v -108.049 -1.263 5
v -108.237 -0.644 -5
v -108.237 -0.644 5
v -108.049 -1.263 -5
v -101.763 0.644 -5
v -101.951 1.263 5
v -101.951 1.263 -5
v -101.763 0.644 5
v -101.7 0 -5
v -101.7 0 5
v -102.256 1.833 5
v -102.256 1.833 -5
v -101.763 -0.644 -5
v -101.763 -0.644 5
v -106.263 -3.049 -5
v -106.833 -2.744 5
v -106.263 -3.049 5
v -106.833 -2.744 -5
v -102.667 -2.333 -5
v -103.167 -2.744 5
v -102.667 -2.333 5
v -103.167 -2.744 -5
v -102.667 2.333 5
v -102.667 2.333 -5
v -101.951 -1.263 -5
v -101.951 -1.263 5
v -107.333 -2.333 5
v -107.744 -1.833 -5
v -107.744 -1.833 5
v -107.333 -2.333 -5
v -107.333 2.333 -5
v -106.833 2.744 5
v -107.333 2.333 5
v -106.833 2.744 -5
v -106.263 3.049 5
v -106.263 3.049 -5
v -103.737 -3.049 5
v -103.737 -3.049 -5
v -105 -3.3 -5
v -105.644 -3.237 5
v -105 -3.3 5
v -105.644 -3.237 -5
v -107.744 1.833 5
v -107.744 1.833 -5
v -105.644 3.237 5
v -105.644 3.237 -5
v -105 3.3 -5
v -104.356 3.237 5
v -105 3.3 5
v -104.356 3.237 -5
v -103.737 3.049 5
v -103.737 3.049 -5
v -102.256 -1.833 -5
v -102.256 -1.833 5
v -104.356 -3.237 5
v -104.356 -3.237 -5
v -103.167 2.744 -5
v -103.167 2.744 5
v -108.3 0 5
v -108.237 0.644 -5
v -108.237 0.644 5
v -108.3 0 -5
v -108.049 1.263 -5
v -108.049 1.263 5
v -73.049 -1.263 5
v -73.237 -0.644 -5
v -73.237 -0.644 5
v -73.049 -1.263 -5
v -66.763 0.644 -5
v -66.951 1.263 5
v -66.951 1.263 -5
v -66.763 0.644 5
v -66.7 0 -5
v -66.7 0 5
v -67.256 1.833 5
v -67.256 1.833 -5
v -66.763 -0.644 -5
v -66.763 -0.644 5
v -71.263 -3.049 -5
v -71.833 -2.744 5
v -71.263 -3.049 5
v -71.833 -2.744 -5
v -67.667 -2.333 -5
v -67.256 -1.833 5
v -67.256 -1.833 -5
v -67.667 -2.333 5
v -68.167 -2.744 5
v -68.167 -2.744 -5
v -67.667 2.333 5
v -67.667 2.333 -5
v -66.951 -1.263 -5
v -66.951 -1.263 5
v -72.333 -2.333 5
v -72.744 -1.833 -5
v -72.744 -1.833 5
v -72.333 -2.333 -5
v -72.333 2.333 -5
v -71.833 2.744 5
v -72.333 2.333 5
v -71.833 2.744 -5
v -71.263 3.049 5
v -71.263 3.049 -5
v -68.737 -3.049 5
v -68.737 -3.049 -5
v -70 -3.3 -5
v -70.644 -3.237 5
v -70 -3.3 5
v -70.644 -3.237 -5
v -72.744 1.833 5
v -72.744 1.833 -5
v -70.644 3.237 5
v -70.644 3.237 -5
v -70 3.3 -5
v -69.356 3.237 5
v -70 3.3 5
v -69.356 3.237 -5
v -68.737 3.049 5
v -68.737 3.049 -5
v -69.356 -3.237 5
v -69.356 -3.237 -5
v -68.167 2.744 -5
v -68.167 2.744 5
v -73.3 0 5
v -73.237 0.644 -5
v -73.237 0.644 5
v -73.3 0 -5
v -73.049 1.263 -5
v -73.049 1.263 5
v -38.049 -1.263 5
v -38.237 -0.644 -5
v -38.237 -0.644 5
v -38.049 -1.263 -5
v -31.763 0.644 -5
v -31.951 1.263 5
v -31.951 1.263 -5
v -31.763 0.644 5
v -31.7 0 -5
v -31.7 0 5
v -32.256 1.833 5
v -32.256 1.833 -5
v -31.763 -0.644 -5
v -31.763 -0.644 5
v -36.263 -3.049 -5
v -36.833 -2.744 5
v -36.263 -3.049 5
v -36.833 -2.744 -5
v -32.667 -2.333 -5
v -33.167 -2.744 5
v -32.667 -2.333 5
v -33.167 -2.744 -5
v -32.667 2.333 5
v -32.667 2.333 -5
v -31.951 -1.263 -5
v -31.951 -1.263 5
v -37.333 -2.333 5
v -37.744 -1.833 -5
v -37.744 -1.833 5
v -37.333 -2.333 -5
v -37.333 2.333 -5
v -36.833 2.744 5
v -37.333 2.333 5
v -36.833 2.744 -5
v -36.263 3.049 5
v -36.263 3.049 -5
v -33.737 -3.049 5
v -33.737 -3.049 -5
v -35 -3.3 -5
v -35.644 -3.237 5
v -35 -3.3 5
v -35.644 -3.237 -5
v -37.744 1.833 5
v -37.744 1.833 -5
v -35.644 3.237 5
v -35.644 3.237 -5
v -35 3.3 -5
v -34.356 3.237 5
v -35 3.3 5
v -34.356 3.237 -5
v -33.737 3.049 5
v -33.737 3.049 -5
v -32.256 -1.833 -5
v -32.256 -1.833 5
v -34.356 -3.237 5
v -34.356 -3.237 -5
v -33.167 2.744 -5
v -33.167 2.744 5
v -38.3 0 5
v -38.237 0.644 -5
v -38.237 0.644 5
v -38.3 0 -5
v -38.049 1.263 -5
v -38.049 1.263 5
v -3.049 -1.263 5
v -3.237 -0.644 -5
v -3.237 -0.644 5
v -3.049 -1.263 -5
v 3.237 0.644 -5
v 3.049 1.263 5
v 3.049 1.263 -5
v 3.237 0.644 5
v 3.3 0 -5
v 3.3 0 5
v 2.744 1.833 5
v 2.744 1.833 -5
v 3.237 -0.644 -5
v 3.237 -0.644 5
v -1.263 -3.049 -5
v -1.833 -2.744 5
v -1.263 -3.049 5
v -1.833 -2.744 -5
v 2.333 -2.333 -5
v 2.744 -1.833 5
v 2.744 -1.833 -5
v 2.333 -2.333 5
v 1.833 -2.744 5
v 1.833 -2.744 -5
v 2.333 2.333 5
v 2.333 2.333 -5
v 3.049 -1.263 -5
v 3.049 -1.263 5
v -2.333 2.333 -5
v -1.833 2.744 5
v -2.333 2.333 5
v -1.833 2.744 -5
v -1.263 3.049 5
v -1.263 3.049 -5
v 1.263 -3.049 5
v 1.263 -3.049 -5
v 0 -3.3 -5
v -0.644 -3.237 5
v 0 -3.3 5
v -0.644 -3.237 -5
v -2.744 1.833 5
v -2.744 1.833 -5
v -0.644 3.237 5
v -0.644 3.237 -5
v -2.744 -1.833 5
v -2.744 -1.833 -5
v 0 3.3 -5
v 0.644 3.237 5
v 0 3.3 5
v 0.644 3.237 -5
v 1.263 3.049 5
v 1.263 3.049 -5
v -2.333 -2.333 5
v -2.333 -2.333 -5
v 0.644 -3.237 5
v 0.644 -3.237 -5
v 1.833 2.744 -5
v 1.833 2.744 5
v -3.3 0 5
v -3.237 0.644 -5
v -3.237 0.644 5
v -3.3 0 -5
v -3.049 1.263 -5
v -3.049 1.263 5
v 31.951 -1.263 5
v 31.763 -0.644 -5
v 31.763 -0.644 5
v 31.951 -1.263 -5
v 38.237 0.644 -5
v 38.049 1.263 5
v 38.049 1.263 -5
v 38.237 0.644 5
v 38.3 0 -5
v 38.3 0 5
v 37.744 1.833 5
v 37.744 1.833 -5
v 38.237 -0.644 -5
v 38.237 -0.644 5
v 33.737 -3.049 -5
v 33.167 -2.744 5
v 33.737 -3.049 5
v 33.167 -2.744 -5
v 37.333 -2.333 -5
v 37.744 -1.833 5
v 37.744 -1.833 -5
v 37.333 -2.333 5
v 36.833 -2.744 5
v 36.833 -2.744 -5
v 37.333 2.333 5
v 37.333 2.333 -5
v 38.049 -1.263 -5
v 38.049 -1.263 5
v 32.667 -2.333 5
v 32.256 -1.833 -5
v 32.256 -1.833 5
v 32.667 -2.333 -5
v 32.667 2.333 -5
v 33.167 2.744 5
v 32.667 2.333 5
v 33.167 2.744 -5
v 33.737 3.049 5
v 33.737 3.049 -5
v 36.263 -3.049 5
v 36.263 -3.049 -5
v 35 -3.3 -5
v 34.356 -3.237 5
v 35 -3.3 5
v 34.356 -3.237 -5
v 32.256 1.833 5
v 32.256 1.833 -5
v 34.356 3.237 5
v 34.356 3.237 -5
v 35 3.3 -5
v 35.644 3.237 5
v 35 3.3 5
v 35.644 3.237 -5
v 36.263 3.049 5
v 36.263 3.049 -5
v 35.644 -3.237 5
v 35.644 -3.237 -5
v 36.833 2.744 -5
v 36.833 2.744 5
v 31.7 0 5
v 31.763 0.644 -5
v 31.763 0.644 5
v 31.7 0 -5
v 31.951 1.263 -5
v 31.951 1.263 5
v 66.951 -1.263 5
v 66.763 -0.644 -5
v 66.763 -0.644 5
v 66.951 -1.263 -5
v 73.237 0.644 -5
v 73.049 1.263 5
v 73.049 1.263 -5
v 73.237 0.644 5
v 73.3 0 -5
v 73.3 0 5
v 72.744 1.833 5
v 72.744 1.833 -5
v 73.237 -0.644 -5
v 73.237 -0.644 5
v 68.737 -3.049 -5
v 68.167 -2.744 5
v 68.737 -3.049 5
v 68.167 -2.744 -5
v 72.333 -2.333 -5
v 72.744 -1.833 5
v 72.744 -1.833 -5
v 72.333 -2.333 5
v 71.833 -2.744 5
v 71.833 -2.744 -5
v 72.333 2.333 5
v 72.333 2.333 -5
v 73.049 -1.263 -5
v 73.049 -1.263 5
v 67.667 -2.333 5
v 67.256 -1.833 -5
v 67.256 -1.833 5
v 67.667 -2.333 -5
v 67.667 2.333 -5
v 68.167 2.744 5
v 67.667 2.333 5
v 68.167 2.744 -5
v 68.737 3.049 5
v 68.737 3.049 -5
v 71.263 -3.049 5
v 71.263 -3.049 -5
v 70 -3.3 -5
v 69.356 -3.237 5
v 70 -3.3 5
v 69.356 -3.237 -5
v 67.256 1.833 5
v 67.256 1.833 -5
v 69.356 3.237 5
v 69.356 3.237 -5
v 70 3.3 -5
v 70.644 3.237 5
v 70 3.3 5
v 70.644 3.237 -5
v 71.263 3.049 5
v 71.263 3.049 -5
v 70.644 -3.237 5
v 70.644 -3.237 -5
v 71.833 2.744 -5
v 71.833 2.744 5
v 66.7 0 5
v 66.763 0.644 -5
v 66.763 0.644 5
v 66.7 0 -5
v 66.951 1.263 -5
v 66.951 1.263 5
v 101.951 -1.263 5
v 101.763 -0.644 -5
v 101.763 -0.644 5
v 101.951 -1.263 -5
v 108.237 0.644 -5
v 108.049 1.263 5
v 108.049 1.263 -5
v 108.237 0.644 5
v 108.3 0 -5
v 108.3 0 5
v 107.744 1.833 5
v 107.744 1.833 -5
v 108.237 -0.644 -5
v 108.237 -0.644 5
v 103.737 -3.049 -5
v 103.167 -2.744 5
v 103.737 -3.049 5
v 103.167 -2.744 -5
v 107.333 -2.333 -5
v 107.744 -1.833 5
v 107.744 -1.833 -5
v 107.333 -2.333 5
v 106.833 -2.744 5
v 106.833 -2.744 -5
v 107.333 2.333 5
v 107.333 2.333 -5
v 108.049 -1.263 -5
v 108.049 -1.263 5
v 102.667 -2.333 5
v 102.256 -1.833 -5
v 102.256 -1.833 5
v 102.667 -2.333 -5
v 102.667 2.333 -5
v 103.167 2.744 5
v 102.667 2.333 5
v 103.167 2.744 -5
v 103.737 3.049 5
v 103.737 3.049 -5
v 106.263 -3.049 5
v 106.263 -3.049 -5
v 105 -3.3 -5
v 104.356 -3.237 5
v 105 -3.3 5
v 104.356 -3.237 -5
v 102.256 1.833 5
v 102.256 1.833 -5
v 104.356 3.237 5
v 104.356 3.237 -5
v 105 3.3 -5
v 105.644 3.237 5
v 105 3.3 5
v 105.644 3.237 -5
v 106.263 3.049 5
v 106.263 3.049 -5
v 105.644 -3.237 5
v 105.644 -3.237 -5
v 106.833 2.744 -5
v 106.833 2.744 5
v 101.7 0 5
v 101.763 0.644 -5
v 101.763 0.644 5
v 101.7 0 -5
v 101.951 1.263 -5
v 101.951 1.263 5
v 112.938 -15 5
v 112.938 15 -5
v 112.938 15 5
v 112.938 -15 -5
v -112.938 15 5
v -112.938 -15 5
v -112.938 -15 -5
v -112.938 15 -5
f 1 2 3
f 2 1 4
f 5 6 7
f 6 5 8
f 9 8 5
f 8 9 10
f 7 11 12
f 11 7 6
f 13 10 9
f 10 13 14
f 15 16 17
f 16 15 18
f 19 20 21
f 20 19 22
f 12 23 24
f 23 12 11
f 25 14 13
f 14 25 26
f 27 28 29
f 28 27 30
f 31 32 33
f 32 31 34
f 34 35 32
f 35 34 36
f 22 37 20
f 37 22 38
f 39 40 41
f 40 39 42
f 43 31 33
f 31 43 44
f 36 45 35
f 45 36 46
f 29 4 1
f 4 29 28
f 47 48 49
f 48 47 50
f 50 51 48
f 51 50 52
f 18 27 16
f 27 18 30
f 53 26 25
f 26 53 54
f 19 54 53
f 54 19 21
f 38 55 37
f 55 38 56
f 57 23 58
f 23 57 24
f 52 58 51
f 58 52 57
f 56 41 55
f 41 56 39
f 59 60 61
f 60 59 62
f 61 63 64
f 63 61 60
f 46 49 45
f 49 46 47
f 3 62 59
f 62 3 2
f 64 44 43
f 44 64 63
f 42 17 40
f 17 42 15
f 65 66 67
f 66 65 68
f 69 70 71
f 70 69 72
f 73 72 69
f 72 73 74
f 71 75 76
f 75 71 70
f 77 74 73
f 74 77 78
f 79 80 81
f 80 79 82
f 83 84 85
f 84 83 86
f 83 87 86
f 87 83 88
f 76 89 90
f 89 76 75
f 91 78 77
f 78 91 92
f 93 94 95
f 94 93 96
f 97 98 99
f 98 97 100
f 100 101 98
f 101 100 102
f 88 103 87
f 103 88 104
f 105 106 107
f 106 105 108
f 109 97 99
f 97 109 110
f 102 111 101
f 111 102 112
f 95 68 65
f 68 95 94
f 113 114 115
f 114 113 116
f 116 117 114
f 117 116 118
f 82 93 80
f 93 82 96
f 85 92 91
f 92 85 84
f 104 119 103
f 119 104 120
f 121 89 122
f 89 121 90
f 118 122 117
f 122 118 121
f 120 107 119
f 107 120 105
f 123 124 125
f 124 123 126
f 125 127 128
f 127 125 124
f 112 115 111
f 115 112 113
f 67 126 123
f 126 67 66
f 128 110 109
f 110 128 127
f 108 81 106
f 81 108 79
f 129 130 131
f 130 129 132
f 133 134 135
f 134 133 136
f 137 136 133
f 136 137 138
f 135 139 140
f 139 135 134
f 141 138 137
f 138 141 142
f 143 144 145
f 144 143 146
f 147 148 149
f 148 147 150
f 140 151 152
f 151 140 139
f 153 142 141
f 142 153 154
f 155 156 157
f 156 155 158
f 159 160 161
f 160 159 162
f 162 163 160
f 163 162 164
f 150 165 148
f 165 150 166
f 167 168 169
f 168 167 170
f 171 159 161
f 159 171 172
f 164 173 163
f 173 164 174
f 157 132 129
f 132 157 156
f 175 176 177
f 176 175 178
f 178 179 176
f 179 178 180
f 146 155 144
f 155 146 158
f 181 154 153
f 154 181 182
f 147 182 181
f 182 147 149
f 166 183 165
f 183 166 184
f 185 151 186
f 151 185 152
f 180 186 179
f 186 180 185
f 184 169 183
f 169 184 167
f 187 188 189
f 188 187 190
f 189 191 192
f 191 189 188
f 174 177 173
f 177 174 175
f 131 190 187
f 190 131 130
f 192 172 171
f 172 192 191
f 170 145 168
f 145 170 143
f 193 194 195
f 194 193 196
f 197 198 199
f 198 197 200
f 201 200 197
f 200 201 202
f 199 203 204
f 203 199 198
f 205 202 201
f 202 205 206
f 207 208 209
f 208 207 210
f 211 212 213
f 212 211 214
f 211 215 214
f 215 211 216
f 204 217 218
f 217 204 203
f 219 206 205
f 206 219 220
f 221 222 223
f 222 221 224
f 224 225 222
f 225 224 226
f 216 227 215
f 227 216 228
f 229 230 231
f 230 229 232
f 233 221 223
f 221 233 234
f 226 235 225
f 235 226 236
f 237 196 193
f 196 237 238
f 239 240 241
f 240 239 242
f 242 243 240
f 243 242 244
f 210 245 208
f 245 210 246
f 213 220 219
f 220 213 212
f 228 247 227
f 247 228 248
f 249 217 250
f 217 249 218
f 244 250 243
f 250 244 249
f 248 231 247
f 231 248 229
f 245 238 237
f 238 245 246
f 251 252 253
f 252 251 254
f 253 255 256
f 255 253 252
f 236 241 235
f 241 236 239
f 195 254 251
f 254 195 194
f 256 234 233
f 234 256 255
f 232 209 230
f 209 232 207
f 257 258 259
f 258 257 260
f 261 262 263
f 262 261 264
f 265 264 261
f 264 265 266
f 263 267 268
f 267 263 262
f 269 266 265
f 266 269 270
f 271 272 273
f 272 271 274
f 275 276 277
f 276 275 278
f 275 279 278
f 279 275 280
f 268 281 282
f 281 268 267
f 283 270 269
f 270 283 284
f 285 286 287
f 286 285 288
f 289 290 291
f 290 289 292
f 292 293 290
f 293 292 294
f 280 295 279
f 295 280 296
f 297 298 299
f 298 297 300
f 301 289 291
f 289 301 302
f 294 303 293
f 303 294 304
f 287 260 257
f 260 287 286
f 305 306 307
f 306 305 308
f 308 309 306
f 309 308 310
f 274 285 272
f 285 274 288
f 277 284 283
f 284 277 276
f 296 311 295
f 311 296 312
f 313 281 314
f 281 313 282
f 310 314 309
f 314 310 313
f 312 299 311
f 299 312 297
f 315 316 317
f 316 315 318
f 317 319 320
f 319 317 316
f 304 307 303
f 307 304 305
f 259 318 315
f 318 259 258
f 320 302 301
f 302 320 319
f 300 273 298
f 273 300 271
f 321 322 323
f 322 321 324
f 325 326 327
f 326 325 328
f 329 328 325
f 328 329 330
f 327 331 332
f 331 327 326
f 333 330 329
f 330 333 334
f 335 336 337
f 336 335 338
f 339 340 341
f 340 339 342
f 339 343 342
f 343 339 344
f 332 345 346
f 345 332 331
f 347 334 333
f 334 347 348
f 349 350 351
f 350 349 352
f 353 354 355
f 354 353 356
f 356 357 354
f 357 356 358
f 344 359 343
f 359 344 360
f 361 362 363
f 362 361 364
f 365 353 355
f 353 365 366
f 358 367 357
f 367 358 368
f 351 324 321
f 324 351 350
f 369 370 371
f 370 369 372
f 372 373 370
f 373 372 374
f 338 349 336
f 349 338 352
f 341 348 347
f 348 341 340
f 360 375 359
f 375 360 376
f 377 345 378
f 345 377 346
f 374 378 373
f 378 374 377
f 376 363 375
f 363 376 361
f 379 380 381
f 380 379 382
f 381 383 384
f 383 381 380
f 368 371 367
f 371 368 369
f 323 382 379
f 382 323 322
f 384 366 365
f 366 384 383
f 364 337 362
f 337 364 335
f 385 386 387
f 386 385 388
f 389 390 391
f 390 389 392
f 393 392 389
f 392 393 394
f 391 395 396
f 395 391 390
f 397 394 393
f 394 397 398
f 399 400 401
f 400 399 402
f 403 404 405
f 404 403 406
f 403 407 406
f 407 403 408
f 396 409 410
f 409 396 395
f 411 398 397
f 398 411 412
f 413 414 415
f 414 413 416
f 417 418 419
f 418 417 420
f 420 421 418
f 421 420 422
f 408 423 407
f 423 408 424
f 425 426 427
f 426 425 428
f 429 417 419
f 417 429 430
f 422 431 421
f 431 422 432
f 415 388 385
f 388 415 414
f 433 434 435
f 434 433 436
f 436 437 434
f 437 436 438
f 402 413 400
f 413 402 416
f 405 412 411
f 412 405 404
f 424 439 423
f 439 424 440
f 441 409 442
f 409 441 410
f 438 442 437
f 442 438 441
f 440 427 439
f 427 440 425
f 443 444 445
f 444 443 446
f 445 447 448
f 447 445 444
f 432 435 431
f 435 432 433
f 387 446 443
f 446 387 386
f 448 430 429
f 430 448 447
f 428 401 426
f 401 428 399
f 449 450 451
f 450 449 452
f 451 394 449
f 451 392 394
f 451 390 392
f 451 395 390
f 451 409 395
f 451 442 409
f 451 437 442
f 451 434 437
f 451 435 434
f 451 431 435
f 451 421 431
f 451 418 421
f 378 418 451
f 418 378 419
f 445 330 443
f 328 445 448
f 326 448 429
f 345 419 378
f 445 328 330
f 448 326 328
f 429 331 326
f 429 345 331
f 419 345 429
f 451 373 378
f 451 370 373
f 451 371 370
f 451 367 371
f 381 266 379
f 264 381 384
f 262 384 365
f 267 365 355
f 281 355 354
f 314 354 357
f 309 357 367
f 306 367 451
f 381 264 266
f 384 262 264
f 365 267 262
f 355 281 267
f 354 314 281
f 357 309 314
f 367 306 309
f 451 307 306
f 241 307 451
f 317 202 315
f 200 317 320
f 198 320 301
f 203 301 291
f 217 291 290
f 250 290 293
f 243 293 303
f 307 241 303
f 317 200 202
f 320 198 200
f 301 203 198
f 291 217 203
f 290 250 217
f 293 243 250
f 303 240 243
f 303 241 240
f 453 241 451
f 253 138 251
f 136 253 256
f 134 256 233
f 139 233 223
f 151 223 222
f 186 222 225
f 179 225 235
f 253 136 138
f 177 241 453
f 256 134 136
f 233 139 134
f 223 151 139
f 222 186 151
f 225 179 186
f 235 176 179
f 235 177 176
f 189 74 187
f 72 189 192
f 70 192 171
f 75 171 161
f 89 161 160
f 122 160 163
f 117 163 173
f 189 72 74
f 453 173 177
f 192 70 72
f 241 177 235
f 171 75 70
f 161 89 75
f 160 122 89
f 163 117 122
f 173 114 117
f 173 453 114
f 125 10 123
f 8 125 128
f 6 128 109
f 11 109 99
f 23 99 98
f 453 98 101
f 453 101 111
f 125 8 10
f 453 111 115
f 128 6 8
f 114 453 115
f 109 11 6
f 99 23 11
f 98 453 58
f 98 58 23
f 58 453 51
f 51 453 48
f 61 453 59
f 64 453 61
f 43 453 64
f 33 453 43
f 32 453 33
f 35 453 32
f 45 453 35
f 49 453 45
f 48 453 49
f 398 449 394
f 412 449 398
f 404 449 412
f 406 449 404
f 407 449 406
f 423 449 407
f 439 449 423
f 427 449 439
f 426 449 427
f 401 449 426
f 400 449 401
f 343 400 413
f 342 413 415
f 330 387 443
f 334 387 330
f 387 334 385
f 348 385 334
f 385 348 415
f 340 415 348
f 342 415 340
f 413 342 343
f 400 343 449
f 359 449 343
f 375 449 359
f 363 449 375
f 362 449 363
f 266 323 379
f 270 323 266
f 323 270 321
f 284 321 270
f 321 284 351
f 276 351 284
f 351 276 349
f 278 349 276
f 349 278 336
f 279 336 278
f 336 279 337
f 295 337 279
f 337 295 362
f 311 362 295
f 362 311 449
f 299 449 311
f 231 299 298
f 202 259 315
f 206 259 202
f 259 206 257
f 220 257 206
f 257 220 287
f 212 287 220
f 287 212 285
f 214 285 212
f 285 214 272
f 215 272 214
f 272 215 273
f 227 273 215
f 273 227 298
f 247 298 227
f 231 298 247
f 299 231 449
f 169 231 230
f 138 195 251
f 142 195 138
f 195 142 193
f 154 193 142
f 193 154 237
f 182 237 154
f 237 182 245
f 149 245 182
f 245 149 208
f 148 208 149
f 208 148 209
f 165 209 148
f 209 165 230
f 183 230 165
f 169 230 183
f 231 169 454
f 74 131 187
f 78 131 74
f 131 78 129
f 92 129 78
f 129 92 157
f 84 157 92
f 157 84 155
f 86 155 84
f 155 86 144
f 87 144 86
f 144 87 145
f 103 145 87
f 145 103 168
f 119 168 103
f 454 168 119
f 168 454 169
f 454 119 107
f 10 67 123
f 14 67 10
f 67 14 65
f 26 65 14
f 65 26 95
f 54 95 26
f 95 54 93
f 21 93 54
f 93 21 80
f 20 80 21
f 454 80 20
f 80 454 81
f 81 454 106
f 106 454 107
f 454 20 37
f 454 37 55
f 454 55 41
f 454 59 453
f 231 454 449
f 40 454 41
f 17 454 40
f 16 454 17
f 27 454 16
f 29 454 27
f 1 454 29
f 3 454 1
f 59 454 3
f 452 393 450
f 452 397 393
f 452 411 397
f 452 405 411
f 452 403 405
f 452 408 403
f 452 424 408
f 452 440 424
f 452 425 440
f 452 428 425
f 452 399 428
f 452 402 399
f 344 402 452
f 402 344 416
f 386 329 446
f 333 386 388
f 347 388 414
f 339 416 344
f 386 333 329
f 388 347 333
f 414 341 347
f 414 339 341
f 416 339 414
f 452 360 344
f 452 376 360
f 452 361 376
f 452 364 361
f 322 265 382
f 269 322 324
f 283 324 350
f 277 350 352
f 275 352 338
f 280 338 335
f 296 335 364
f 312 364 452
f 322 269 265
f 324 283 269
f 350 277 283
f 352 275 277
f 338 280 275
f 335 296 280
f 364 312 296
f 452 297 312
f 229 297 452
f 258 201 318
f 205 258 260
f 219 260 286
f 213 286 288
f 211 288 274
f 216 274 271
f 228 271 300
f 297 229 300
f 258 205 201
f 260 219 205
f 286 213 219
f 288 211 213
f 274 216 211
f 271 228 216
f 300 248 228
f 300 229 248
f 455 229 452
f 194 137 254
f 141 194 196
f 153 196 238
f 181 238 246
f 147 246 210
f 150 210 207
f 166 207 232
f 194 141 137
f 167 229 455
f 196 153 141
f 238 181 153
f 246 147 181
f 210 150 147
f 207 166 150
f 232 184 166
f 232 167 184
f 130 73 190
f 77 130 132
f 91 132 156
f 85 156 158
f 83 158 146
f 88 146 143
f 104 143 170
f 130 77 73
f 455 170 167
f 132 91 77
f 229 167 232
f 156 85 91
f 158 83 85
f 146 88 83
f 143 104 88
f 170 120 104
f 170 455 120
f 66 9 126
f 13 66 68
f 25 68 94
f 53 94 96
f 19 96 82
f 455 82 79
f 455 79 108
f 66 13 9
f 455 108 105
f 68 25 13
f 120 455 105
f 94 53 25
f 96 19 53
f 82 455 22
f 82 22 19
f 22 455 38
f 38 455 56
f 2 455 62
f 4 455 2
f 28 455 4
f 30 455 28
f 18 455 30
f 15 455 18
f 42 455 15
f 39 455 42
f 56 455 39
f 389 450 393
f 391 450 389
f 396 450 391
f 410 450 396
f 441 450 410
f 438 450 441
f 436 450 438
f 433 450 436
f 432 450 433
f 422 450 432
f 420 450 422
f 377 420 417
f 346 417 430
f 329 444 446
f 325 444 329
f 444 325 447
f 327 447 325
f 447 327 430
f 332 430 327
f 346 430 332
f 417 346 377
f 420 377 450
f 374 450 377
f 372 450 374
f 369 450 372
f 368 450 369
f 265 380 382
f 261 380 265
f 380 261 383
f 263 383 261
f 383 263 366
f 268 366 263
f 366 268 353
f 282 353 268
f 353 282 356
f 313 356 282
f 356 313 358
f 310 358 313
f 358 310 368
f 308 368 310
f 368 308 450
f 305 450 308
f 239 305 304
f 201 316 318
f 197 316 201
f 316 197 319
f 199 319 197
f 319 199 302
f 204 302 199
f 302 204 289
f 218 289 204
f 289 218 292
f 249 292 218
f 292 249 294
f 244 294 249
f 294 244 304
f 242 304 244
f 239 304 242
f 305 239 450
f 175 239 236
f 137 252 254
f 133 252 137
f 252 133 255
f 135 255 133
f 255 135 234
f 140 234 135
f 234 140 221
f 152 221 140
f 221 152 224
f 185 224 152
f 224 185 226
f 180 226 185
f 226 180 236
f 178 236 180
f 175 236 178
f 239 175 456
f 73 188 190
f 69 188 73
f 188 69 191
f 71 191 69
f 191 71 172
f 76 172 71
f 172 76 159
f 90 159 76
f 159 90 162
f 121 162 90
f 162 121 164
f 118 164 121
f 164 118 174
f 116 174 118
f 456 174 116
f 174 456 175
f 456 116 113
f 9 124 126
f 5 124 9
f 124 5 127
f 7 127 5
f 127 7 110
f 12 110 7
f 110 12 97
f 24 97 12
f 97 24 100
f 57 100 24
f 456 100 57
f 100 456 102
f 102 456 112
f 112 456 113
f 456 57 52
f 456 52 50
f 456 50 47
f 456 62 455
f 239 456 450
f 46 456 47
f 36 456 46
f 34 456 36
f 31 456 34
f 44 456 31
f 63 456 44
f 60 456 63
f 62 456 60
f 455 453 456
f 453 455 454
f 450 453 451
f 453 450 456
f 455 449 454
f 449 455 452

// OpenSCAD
$fn = 32;

// ----------------------------------------------------------------------
// Hole bar, 7 x Ø6.6
// row layout, 7.9375 mm edge offset
// ----------------------------------------------------------------------

// --- parameters (mm) ---
bar_w = 30;    // bar width (Y)
bar_t = 10;    // bar thickness (Z)
holes = 7;     // holes per row
hole_d = 6.6;  // hole diameter
edge = 7.938;  // offset from the bar end to the first hole
pitch = 35;    // pitch between neighbouring holes

// --- derived feature positions (mm) ---
span = (holes - 1) * pitch;   // = 210   distance between the end holes
bar_l = span + 2 * edge;      // = 225.88   overall bar length
start_x = -bar_l / 2 + edge;  // = -105   X of the first hole
feature_centers = [
  [start_x + 0 * pitch, 0],
  [start_x + 1 * pitch, 0],
  [start_x + 2 * pitch, 0],
  [start_x + 3 * pitch, 0],
  [start_x + 4 * pitch, 0],
  [start_x + 5 * pitch, 0],
  [start_x + 6 * pitch, 0]
];   // hole centres of the first row

// bar with one row of holes, drilled from feature_centers
difference() {
  translate([-bar_l / 2, -bar_w / 2, -bar_t / 2]) cube([bar_l, bar_w, bar_t]);
  for (centre = feature_centers)
    translate([centre[0], centre[1], 0])
      cylinder(d = hole_d, h = bar_t + 2, center = true);
}
